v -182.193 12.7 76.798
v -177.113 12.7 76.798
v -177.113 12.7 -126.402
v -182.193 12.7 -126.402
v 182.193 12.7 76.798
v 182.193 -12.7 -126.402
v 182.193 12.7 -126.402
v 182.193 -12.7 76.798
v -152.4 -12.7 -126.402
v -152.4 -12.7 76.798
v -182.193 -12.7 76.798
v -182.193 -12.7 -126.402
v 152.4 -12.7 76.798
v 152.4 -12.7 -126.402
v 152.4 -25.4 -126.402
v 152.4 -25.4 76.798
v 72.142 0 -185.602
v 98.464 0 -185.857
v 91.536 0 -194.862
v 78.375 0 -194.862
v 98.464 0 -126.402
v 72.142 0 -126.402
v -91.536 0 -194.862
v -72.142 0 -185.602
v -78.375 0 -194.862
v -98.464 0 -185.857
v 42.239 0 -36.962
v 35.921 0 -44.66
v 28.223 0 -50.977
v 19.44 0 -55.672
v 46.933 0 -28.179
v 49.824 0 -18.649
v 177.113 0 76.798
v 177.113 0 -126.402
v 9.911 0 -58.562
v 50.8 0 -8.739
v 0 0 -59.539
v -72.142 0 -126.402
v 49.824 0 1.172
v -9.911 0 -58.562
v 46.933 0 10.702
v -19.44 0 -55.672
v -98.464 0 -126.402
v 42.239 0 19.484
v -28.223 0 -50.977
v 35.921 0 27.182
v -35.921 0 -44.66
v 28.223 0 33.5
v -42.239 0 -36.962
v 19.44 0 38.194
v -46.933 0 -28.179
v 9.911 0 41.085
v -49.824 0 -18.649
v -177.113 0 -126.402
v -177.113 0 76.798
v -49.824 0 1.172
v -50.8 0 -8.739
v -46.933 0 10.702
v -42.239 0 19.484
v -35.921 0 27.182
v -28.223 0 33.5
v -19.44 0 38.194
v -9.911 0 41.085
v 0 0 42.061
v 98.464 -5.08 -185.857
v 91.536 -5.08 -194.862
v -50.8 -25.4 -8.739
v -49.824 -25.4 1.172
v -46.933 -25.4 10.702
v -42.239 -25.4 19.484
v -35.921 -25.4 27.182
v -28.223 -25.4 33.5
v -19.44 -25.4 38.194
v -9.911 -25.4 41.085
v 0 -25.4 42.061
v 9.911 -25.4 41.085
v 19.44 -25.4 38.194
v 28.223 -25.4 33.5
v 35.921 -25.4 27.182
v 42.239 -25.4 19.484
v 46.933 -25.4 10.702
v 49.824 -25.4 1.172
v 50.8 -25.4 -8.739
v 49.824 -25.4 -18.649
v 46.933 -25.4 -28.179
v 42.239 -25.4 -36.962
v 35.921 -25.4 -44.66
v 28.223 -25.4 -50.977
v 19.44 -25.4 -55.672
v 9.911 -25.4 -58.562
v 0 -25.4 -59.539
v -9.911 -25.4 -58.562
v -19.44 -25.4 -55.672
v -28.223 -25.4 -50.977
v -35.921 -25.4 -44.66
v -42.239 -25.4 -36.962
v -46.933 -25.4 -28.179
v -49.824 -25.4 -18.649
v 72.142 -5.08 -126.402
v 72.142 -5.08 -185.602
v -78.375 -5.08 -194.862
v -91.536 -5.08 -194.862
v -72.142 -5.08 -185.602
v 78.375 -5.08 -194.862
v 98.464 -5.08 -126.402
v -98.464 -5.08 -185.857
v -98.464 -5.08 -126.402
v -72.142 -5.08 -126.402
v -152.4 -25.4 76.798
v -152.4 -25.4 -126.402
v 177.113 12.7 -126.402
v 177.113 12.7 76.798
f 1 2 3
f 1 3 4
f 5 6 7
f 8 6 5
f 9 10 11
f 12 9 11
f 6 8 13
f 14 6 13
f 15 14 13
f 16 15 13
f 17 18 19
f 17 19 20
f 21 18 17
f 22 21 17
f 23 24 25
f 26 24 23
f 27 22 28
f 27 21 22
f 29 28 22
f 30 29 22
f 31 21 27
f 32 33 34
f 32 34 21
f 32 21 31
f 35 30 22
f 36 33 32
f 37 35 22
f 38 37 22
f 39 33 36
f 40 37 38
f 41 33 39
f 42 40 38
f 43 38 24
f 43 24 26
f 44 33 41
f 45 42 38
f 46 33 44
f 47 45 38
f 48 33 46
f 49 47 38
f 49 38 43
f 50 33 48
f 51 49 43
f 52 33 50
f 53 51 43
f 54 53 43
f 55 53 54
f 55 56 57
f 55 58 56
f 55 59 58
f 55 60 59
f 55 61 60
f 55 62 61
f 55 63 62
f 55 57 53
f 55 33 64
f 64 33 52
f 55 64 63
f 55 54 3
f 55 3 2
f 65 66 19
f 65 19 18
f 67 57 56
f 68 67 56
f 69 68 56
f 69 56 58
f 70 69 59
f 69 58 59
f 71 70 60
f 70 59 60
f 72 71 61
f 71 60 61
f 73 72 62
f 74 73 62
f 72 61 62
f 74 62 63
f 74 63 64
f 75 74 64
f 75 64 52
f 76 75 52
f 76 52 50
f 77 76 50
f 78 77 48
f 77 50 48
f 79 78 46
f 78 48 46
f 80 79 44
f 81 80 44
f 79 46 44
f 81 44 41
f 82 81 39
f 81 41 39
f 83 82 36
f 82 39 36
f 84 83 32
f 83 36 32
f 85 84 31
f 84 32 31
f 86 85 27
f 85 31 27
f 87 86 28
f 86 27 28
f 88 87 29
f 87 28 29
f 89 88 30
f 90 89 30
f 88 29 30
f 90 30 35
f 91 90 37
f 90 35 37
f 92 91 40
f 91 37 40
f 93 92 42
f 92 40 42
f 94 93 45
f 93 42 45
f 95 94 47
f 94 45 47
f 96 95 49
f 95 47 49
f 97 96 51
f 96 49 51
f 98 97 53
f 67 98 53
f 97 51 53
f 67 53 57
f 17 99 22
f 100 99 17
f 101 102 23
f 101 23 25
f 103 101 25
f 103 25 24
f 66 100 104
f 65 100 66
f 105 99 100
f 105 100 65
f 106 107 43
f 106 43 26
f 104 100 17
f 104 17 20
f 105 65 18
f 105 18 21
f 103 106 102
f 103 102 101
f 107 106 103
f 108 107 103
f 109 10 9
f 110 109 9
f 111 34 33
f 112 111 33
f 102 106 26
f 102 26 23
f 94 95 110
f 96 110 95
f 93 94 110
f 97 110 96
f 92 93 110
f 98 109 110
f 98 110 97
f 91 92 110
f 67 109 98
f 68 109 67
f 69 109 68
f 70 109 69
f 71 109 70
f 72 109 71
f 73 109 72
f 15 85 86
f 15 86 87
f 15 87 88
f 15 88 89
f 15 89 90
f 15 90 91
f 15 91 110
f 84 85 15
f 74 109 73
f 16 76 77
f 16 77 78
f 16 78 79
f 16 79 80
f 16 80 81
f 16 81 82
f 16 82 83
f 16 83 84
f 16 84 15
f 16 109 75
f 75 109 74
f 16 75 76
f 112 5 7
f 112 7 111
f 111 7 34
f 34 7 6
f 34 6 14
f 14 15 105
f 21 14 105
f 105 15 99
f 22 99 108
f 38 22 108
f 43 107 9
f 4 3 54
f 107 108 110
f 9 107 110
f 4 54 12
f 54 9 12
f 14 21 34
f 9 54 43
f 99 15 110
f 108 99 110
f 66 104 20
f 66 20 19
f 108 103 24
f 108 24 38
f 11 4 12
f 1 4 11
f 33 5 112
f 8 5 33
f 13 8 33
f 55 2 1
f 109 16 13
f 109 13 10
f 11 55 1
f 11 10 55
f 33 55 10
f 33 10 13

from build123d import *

# Parameters (mm, degrees)
F1_DEPTH = 25.4
F3_START = -20.32
F3_DEPTH = 5.08
F4_W     = 43.18
F4_H     = 203.2
F5_DEPTH = 12.7
F6_W     = 5.08
F6_H     = 203.2
F7_DEPTH = 12.7
F8_R     = 50.8
F9_DEPTH = 25.4


with BuildPart() as f1:
    # F0 (on Front) → F1 (new body)
    with BuildSketch(Plane.XZ):
        Polygon((0, 76.7976452439), (-152.4, 76.7976452439), (-152.4, -126.4023547561), (0, -126.4023547561), (152.4, -126.4023547561), (152.4, 76.7976452439), align=None)
    extrude(amount=F1_DEPTH)

    # F2 (on face) → F3 (join)
    with BuildSketch(Plane.XZ.offset(25.4).offset(F3_START)):
        Polygon((-72.1423849463, -126.4023547561), (-98.4636694193, -126.4023547561), (-98.4636694193, -185.8566617808), (-72.1423849463, -185.6018817267), align=None)
        Polygon((-72.1423849463, -185.6018817267), (-98.4636694193, -185.8566617808), (-91.5363952518, -194.8621189437), (-78.3745795488, -194.8621189437), align=None)
        Polygon((72.1423849463, -126.4023547561), (72.1423849463, -185.6018817267), (98.4636694193, -185.8566617808), (98.4636694193, -126.4023547561), align=None)
        Polygon((98.4636694193, -185.8566617808), (72.1423849463, -185.6018817267), (78.3745795488, -194.8621189437), (91.5363952518, -194.8621189437), align=None)
    extrude(amount=-F3_DEPTH)

    # F4 (on face) → F5 (join)
    with BuildSketch(Plane(origin=(0, 0, 0), x_dir=(-1, 0, 0), z_dir=(0, 1, 0))):
        with Locations((-160.6027390623, -24.8023547561)):
            Rectangle(F4_W, F4_H)
        with Locations((160.6027390623, -24.8023547561)):
            Rectangle(F4_W, F4_H)
    extrude(amount=-F5_DEPTH)

    # F6 (on face) → F7 (join)
    with BuildSketch(Plane(origin=(0, 0, 0), x_dir=(-1, 0, 0), z_dir=(0, 1, 0))):
        with Locations((-179.6527390623, -24.8023547561)):
            Rectangle(F6_W, F6_H)
        with Locations((179.6527390623, -24.8023547561)):
            Rectangle(F6_W, F6_H)
    extrude(amount=F7_DEPTH)

    # F8 (on face) → F9 (cut)
    with BuildSketch(Plane(origin=(0, 0, 0), x_dir=(-1, 0, 0), z_dir=(0, 1, 0))):
        with Locations((0, -8.7385885348)):
            Circle(F8_R)
    extrude(amount=-F9_DEPTH, mode=Mode.SUBTRACT)


solid = f1.part
